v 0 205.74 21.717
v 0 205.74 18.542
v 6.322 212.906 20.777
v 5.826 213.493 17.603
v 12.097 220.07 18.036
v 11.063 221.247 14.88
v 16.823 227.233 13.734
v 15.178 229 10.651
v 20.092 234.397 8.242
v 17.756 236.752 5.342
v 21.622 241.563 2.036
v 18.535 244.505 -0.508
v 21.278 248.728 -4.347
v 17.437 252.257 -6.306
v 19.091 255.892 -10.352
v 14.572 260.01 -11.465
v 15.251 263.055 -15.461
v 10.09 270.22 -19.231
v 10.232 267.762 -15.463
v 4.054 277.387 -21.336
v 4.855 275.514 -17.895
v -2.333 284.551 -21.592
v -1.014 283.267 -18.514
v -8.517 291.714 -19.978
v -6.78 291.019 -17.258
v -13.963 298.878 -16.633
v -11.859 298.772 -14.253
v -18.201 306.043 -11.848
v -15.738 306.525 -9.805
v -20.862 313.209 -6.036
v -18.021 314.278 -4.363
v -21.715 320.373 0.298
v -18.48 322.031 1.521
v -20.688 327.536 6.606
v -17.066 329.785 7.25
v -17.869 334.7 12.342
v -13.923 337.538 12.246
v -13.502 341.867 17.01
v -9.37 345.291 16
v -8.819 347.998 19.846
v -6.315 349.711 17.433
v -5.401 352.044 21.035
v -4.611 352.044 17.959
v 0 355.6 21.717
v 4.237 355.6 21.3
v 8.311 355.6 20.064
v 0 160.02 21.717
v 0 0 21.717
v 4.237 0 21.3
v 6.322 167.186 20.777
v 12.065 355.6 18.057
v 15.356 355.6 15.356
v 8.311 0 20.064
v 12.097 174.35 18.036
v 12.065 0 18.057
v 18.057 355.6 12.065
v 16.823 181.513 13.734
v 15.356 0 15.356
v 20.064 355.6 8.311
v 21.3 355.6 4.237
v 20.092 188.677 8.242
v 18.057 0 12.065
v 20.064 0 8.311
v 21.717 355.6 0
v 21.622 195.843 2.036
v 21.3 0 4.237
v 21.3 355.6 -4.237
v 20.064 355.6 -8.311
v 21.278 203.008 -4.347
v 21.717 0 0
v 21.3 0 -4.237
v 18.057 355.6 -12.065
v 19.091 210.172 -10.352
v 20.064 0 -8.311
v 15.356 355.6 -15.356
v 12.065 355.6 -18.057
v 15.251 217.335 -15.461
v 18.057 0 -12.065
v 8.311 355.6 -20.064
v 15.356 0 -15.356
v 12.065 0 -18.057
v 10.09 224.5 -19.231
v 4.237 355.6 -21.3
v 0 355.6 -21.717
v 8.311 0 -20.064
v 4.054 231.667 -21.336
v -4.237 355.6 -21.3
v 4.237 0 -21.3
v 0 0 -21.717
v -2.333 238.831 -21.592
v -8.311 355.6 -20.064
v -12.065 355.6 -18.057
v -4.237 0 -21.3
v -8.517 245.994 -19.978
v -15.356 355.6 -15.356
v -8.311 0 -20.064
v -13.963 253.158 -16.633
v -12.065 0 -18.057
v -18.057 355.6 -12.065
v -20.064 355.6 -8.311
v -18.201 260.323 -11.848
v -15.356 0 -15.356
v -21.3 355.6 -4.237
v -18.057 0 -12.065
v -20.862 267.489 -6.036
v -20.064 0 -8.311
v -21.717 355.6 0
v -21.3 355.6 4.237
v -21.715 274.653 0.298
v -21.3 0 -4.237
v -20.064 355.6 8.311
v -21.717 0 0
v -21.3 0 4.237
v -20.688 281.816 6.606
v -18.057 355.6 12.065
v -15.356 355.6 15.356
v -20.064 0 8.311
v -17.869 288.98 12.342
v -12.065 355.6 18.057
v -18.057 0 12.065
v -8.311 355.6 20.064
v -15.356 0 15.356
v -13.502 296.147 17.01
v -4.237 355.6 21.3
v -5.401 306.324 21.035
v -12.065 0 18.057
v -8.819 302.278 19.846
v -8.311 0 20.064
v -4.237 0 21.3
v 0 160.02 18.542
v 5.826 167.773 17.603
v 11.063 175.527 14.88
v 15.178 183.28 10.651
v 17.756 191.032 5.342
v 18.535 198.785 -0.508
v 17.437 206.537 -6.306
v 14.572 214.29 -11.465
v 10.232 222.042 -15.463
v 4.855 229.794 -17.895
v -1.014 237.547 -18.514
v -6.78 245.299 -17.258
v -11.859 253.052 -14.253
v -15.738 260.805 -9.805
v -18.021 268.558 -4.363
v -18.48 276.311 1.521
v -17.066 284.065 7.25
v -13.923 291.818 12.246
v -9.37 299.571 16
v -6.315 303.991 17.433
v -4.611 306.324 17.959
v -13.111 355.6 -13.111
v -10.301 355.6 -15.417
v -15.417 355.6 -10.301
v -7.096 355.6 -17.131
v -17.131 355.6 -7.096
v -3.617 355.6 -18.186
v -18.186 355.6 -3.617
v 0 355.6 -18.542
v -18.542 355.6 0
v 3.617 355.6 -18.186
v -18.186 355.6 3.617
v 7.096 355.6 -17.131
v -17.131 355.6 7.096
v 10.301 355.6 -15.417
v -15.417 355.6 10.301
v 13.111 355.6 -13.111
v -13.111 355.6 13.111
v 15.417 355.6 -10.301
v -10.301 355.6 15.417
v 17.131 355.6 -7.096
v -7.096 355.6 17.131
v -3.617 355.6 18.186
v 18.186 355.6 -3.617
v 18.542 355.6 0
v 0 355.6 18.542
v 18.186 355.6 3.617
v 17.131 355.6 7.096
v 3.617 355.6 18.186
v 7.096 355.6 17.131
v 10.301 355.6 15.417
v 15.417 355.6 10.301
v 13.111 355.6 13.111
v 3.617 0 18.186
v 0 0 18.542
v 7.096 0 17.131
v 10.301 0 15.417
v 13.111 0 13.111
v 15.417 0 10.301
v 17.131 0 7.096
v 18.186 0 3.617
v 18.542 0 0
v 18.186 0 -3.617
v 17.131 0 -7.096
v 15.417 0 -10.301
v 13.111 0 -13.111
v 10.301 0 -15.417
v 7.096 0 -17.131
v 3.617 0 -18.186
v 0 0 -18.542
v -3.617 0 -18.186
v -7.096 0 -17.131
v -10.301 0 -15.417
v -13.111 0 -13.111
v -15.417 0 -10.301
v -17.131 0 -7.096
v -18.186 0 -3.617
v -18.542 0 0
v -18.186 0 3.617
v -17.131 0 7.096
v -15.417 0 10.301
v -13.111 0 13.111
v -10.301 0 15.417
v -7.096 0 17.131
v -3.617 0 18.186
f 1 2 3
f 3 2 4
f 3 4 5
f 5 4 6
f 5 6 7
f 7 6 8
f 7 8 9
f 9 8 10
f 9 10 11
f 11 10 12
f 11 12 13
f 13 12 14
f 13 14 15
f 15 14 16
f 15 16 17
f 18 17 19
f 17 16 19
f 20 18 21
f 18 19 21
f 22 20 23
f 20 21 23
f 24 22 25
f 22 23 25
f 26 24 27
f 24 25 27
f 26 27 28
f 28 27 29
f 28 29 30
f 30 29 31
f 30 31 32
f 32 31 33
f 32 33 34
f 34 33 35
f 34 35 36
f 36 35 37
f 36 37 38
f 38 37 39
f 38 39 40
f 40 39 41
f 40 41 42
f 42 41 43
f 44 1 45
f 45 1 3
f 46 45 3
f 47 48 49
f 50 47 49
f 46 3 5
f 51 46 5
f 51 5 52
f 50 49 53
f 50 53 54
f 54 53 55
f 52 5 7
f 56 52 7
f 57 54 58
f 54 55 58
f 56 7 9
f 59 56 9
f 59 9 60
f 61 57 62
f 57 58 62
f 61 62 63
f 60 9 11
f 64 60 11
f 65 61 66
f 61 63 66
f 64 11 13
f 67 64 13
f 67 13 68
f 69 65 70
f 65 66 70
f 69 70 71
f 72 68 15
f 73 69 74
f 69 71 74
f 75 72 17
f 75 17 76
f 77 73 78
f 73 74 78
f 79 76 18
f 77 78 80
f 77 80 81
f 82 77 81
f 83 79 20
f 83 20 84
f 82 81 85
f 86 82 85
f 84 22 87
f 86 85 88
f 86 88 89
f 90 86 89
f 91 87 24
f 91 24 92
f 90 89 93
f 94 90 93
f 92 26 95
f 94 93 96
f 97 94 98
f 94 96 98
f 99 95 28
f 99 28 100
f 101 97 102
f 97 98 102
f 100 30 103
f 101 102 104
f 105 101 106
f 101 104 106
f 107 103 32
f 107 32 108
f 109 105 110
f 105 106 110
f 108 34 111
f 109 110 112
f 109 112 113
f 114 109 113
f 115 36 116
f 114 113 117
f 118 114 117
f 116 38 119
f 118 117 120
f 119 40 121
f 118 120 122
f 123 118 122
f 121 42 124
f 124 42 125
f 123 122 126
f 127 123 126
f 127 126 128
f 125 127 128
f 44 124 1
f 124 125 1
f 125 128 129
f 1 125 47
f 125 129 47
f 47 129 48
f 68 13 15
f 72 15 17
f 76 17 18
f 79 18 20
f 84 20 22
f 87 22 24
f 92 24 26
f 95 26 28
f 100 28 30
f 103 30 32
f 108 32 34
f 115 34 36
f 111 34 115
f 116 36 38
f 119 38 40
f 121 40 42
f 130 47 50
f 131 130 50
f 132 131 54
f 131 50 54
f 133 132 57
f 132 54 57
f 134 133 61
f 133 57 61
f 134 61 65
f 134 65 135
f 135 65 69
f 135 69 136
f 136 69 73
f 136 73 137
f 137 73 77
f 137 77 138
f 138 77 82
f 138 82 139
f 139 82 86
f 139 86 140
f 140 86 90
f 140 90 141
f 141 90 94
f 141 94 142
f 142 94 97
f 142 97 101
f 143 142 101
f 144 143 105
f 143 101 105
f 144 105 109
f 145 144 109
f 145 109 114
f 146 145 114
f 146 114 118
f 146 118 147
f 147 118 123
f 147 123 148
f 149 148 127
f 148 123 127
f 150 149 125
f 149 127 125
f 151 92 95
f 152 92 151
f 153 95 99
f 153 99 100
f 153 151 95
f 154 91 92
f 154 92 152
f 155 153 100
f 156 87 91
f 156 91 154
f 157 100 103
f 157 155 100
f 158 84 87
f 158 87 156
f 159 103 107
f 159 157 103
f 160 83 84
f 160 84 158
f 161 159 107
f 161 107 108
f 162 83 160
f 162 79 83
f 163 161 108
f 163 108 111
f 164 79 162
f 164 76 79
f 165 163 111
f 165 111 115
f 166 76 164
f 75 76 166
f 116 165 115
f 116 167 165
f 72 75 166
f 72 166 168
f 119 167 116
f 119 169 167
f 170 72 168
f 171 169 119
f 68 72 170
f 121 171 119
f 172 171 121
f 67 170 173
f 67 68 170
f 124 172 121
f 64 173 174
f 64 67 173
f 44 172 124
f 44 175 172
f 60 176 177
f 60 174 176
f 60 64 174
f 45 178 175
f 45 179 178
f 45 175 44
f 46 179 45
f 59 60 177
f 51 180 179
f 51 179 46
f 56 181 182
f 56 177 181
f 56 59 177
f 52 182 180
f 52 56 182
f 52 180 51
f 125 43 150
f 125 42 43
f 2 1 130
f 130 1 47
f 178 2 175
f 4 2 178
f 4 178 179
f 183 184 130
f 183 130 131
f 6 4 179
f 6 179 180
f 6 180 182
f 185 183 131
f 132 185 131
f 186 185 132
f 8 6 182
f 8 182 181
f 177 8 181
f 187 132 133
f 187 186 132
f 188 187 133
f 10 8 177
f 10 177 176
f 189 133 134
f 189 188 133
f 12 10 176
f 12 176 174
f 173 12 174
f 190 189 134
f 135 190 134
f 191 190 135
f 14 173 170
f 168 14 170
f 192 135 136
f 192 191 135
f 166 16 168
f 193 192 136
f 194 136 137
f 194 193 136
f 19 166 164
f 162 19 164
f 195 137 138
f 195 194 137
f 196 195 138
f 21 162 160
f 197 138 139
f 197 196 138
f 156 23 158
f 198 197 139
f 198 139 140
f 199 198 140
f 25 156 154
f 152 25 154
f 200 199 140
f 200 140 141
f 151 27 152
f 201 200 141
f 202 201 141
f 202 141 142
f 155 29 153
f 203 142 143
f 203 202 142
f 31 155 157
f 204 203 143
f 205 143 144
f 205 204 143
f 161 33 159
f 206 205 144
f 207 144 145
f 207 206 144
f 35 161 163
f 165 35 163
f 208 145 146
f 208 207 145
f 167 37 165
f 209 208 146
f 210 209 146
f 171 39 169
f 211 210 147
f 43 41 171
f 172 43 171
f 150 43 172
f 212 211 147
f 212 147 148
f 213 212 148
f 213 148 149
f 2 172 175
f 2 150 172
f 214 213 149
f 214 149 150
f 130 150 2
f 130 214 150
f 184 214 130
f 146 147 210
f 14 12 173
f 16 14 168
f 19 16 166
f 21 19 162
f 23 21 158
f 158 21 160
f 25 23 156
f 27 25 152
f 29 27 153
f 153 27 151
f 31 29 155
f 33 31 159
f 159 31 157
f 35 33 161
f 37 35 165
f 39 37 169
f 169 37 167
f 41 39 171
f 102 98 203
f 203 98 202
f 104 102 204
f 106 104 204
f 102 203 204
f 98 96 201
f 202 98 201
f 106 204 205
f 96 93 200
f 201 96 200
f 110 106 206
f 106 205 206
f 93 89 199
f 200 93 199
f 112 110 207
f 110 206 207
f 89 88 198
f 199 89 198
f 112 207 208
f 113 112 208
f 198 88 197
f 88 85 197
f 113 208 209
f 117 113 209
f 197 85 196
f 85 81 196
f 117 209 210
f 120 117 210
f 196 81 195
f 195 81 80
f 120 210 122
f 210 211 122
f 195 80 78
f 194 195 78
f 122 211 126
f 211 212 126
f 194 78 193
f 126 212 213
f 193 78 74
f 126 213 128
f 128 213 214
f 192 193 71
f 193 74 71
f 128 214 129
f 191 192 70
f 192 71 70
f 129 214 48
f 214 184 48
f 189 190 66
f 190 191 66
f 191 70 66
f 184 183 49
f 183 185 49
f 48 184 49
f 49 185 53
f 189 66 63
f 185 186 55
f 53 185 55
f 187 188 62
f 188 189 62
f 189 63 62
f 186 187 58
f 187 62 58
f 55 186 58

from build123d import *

# Parameters (mm, degrees)
SKETCH1_R           = 21.717
SKETCH1_R_2         = 18.542
BOSS_EXTRUDE1_DEPTH = 355.6
CUT_SWEEP1_PITCH    = 152.4


with BuildPart() as part:
    # Sketch1 → Boss-Extrude1 (new body)
    with BuildSketch(Plane(origin=(0, 0, 0), x_dir=(1, 0, 0), z_dir=(0, 1, 0))):
        with Locations(Location((0, 0, 0), (0, 0, 270))):
            Circle(SKETCH1_R)
        with Locations(Location((0, 0, 0), (0, 0, 270))):
            Circle(SKETCH1_R_2, mode=Mode.SUBTRACT)
    extrude(amount=BOSS_EXTRUDE1_DEPTH)

    # Cut-Sweep1: the profile of Sketch6 profile screwed along a right-hand helix of 0.96 turns, 38 arcs to a turn; built about Z, then put on its axis
    cut_sweep1_z = Axis((0, 0, 0), (0, 0, 1))
    cut_sweep1_corners = [(18.542, 0, -22.86), (21.7173, 0, -22.86), (21.7173, 0, 22.86), (18.542, 0, 22.86)]
    with BuildLine(mode=Mode.PRIVATE) as cut_sweep1_profile:
        Line(cut_sweep1_corners[0], cut_sweep1_corners[1])
        Line(cut_sweep1_corners[1], cut_sweep1_corners[2])
        Line(cut_sweep1_corners[2], cut_sweep1_corners[3])
        Line(cut_sweep1_corners[3], cut_sweep1_corners[0])
    cut_sweep1_cap = Face(cut_sweep1_profile.wire())
    cut_sweep1_turn_angles = [0, 4.736842105, 9.473684211, 14.210526316, 18.947368421, 23.684210526, 28.421052632, 33.157894737, 37.894736842, 42.631578947, 47.368421053, 52.105263158, 56.842105263, 61.578947368, 66.315789474, 71.052631579, 75.789473684, 80.526315789, 85.263157895, 90, 94.736842105, 99.473684211, 104.210526316, 108.947368421, 113.684210526, 118.421052632, 123.157894737, 127.894736842, 132.631578947, 137.368421053, 142.105263158, 146.842105263, 151.578947368, 156.315789474, 161.052631579, 165.789473684, 170.526315789, 175.263157895, 180, 184.736842105, 189.473684211, 194.210526316, 198.947368421, 203.684210526, 208.421052632, 213.157894737, 217.894736842, 222.631578947, 227.368421053, 232.105263158, 236.842105263, 241.578947368, 246.315789474, 251.052631579, 255.789473684, 260.526315789, 265.263157895, 270, 274.736842105, 279.473684211, 284.210526316, 288.947368421, 293.684210526, 298.421052632, 303.157894737, 307.894736842, 312.631578947, 317.368421053, 322.105263158, 326.842105263, 331.578947368, 336.315789474, 341.052631579, 343.326315789, 345.6]
    cut_sweep1_turn_weights = [1, 0.9965844930066698, 1, 0.9965844930066698, 1, 0.9965844930066698, 1, 0.9965844930066698, 1, 0.9965844930066698, 1, 0.9965844930066698, 1, 0.9965844930066698, 1, 0.9965844930066698, 1, 0.9965844930066698, 1, 0.9965844930066698, 1, 0.9965844930066698, 1, 0.9965844930066698, 1, 0.9965844930066698, 1, 0.9965844930066698, 1, 0.9965844930066698, 1, 0.9965844930066698, 1, 0.9965844930066698, 1, 0.9965844930066698, 1, 0.9965844930066698, 1, 0.9965844930066698, 1, 0.9965844930066698, 1, 0.9965844930066698, 1, 0.9965844930066698, 1, 0.9965844930066698, 1, 0.9965844930066698, 1, 0.9965844930066698, 1, 0.9965844930066698, 1, 0.9965844930066698, 1, 0.9965844930066698, 1, 0.9965844930066698, 1, 0.9965844930066698, 1, 0.9965844930066698, 1, 0.9965844930066698, 1, 0.9965844930066698, 1, 0.9965844930066698, 1, 0.9965844930066698, 1, 0.9992127221406268, 1]
    cut_sweep1_turn_rails = [Edge.make_bspline([Vector(p[0], p[1], 0).rotate(cut_sweep1_z, cut_sweep1_turn_angles[k]) / cut_sweep1_turn_weights[k] + Vector(0, 0, p[2] + CUT_SWEEP1_PITCH * cut_sweep1_turn_angles[k] / 360) for k in range(75)], [0, 0, 0, 1, 1, 2, 2, 3, 3, 4, 4, 5, 5, 6, 6, 7, 7, 8, 8, 9, 9, 10, 10, 11, 11, 12, 12, 13, 13, 14, 14, 15, 15, 16, 16, 17, 17, 18, 18, 19, 19, 20, 20, 21, 21, 22, 22, 23, 23, 24, 24, 25, 25, 26, 26, 27, 27, 28, 28, 29, 29, 30, 30, 31, 31, 32, 32, 33, 33, 34, 34, 35, 35, 36, 36, 37, 37, 37], 2, cut_sweep1_turn_weights) for p in cut_sweep1_corners]
    cut_sweep1_turn_sides = [Face.make_surface_from_curves(cut_sweep1_turn_rails[p[0]], cut_sweep1_turn_rails[p[1]]) for p in [(0, 1), (1, 2), (2, 3), (3, 0)]]
    cut_sweep1 = Plane(origin=(0, 182.88, 0), x_dir=(0, 0, 1), z_dir=(0, 1, 0)) * Solid(Shell([*cut_sweep1_turn_sides, cut_sweep1_cap, cut_sweep1_cap.rotate(cut_sweep1_z, 345.6).moved(Location((0, 0, CUT_SWEEP1_PITCH * 345.6 / 360)))]))
    add(cut_sweep1, mode=Mode.SUBTRACT)


solid = part.part
